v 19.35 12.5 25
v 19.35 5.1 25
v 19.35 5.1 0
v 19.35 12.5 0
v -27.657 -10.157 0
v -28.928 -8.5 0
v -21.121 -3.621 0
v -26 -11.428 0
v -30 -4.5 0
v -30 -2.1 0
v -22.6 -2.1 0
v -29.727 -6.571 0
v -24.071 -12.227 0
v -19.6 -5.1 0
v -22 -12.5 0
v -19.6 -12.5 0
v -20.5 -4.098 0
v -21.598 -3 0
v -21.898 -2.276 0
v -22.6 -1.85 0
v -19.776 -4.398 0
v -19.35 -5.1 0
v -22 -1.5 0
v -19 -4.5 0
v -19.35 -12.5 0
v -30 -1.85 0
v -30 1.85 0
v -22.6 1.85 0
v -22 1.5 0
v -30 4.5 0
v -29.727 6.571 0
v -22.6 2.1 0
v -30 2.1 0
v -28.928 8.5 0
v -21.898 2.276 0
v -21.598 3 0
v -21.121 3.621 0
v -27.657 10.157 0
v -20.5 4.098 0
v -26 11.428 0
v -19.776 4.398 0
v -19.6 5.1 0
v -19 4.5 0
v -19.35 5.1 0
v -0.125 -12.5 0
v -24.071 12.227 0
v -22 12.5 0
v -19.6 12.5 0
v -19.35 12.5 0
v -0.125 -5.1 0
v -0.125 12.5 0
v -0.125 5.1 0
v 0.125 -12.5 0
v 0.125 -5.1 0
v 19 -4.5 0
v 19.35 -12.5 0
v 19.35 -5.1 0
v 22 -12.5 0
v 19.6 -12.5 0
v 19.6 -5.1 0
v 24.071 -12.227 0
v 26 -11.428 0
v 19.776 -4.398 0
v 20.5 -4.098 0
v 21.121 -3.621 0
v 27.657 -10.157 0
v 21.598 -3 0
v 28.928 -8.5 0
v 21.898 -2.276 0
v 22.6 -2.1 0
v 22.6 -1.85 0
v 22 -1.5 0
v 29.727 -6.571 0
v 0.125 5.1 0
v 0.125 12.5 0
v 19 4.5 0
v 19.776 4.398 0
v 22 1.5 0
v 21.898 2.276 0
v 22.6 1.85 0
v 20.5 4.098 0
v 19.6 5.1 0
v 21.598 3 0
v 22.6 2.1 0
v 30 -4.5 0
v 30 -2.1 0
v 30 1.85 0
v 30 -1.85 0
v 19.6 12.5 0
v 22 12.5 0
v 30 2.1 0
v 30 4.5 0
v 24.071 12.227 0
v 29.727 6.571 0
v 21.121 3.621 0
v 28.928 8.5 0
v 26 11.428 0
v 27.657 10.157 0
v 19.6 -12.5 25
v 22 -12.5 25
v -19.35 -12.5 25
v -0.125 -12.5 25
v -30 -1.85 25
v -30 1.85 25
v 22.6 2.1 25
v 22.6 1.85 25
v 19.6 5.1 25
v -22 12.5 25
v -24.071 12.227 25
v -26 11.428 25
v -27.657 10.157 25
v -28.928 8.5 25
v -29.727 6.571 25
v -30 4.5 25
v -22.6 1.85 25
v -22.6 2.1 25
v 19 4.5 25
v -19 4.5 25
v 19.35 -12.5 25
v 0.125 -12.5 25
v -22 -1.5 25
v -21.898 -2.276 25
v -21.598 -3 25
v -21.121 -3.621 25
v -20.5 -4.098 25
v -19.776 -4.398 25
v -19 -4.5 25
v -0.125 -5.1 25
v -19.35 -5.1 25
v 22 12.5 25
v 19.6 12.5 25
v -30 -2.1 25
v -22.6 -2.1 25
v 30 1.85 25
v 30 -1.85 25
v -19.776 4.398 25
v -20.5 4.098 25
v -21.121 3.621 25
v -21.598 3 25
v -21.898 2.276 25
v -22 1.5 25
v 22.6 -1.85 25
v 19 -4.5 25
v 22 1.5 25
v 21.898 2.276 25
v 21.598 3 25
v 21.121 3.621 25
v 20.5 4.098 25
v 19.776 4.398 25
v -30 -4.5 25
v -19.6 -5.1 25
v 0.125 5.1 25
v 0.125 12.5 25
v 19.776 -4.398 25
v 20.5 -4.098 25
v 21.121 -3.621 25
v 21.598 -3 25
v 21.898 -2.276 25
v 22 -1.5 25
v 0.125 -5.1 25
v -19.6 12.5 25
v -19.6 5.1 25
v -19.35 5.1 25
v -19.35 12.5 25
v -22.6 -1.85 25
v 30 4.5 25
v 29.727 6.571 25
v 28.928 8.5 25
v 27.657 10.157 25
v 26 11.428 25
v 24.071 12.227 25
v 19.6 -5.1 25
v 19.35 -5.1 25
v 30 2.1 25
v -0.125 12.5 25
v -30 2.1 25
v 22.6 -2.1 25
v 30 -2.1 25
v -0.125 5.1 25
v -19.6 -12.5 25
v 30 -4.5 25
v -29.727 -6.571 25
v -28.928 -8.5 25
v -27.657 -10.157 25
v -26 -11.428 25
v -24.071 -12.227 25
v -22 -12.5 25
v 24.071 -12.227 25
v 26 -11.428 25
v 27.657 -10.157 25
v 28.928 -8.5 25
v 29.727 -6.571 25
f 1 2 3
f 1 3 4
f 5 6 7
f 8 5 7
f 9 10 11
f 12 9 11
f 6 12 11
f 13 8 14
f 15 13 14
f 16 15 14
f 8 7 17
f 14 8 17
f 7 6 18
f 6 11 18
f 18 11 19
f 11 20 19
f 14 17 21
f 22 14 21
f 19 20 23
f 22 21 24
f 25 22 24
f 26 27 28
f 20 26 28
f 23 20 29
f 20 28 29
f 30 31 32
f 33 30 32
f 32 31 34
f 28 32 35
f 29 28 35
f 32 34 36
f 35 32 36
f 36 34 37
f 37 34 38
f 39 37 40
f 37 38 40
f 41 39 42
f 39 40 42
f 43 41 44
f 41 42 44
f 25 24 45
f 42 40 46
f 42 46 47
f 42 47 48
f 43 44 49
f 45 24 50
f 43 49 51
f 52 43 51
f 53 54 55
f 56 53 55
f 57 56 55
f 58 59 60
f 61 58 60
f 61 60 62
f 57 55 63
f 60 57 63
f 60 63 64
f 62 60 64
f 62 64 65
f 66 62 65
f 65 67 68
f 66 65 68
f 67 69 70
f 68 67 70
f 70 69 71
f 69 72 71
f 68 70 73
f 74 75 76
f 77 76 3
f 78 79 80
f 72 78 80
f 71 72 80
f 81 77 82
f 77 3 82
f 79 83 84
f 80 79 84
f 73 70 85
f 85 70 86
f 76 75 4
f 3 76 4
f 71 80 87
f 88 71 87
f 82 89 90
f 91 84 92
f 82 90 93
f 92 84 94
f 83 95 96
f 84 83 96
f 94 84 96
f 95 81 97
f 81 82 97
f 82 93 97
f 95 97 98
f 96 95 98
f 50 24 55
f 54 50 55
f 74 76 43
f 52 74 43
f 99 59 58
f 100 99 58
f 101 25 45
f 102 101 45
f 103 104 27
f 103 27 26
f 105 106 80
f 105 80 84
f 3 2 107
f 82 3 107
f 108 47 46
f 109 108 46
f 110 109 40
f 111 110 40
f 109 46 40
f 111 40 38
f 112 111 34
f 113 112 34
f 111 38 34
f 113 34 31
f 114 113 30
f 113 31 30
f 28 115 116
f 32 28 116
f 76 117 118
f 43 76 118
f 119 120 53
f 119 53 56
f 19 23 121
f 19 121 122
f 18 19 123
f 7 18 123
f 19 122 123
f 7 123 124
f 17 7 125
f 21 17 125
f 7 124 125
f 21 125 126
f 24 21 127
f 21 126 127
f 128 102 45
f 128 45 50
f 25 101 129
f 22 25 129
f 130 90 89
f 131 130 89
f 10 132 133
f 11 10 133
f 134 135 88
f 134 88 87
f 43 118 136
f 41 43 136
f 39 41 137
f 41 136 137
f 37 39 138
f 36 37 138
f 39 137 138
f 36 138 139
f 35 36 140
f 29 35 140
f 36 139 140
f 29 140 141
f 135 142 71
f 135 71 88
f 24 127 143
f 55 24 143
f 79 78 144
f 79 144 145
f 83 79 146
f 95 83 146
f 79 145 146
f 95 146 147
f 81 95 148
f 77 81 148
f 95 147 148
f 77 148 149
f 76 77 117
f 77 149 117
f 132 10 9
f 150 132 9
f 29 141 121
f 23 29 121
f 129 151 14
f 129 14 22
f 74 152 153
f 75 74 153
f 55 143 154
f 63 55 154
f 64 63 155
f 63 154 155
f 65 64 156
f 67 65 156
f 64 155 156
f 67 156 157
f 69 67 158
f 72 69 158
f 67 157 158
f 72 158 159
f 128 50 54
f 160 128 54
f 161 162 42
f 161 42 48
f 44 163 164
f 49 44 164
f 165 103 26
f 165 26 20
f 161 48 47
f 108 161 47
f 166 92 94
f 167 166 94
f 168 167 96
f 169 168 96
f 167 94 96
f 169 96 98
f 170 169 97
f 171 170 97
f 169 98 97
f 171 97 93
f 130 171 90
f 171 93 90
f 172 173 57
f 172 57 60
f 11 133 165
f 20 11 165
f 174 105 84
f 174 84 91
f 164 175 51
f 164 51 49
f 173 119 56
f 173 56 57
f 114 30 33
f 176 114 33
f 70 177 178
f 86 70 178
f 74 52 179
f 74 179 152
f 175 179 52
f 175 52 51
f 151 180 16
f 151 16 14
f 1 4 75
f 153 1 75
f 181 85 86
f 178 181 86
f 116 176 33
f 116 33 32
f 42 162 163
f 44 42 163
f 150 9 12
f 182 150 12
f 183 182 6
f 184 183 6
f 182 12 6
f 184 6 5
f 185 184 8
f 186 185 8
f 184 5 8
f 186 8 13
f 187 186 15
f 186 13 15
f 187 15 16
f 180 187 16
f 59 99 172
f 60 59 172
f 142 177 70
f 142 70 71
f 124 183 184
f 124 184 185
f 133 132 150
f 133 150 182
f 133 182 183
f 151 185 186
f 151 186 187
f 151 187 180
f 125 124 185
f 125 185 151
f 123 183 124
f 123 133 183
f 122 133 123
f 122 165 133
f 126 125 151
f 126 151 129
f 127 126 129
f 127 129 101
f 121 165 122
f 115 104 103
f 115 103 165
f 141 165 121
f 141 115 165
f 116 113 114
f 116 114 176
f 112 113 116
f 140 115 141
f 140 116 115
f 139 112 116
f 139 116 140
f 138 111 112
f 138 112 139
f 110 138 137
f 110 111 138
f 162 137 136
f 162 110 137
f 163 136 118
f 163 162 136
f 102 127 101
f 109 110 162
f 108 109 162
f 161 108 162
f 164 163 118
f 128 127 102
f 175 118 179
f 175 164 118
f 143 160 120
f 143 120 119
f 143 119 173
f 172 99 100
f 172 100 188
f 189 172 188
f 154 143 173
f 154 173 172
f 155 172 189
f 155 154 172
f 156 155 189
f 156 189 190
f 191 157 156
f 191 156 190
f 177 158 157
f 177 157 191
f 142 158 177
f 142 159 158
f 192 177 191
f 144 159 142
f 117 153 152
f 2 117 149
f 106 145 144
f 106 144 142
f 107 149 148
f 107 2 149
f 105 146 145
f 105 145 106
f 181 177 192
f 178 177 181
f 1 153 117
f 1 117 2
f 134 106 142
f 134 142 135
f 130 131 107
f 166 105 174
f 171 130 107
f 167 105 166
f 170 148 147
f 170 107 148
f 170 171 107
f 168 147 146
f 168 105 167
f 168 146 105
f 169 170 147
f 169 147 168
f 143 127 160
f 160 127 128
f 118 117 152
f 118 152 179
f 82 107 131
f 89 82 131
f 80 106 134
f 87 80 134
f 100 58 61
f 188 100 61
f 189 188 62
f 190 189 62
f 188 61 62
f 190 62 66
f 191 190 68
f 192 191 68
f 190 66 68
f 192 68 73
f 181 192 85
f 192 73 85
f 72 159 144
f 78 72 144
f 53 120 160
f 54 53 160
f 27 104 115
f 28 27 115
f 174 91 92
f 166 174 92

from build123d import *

# Parameters (mm, degrees)
F1_DEPTH = 25
F3_DEPTH = 25
F4_DEPTH = 50.001
F5_W     = 0.25
F5_H     = 7.4
F5_W_2   = 7.4
F5_H_2   = 0.25
F6_DEPTH = 25.001


with BuildPart() as f1:
    # F0 (on Top) → F1 (new body)
    with BuildSketch(Plane.XY):
        with BuildLine():
            ThreePointArc((30, 4.5), (27.656854, 10.156854), (22, 12.5))
            Line((22, 12.5), (-22, 12.5))
            ThreePointArc((-22, 12.5), (-27.656854, 10.156854), (-30, 4.5))
            Line((-30, 4.5), (-30, -4.5))
            ThreePointArc((-30, -4.5), (-27.656854, -10.156854), (-22, -12.5))
            Line((-22, -12.5), (22, -12.5))
            ThreePointArc((22, -12.5), (27.656854, -10.156854), (30, -4.5))
            Line((30, -4.5), (30, 4.5))
        make_face()
    extrude(amount=F1_DEPTH)

    # F2 (on face) → F3 (join)
    with BuildSketch(Plane.XY.offset(25)):
        with BuildLine():
            ThreePointArc((22, 1.5), (21.12132, 3.62132), (19, 4.5))
            Line((19, 4.5), (-19, 4.5))
            ThreePointArc((-19, 4.5), (-21.12132, 3.62132), (-22, 1.5))
            Line((-22, 1.5), (-22, -1.5))
            ThreePointArc((-22, -1.5), (-21.12132, -3.62132), (-19, -4.5))
            Line((-19, -4.5), (19, -4.5))
            ThreePointArc((19, -4.5), (21.12132, -3.62132), (22, -1.5))
            Line((22, -1.5), (22, 1.5))
        make_face()
    extrude(amount=F3_DEPTH)

    # F3_face (on face) → F4 (cut, through all)
    with BuildSketch(Plane.XY.offset(50)):
        with BuildLine():
            ThreePointArc((22, 1.5), (21.12132, 3.62132), (19, 4.5))
            Line((19, 4.5), (-19, 4.5))
            ThreePointArc((-19, 4.5), (-21.12132, 3.62132), (-22, 1.5))
            Line((-22, 1.5), (-22, -1.5))
            ThreePointArc((-22, -1.5), (-21.12132, -3.62132), (-19, -4.5))
            Line((-19, -4.5), (19, -4.5))
            ThreePointArc((19, -4.5), (21.12132, -3.62132), (22, -1.5))
            Line((22, -1.5), (22, 1.5))
        make_face()
    extrude(amount=-F4_DEPTH, mode=Mode.SUBTRACT)

    # F5 (on face) → F6 (cut, through all)
    with BuildSketch(Plane.XY.offset(25)):
        with Locations((-19.475, 8.8)):
            Rectangle(F5_W, F5_H)
        with Locations((19.475, 8.8)):
            Rectangle(F5_W, F5_H)
        with Locations((-19.475, -8.8)):
            Rectangle(F5_W, F5_H)
        with Locations((19.475, -8.8)):
            Rectangle(F5_W, F5_H)
        with Locations((26.3, -1.975)):
            Rectangle(F5_W_2, F5_H_2)
        with Locations((26.3, 1.975)):
            Rectangle(F5_W_2, F5_H_2)
        with Locations((-26.3, 1.975)):
            Rectangle(F5_W_2, F5_H_2)
        with Locations((-26.3, -1.975)):
            Rectangle(F5_W_2, F5_H_2)
        with Locations((0, -8.8)):
            Rectangle(F5_W, F5_H)
        with Locations((0, 8.8)):
            Rectangle(F5_W, F5_H)
    extrude(amount=-F6_DEPTH, mode=Mode.SUBTRACT)


solid = f1.part
